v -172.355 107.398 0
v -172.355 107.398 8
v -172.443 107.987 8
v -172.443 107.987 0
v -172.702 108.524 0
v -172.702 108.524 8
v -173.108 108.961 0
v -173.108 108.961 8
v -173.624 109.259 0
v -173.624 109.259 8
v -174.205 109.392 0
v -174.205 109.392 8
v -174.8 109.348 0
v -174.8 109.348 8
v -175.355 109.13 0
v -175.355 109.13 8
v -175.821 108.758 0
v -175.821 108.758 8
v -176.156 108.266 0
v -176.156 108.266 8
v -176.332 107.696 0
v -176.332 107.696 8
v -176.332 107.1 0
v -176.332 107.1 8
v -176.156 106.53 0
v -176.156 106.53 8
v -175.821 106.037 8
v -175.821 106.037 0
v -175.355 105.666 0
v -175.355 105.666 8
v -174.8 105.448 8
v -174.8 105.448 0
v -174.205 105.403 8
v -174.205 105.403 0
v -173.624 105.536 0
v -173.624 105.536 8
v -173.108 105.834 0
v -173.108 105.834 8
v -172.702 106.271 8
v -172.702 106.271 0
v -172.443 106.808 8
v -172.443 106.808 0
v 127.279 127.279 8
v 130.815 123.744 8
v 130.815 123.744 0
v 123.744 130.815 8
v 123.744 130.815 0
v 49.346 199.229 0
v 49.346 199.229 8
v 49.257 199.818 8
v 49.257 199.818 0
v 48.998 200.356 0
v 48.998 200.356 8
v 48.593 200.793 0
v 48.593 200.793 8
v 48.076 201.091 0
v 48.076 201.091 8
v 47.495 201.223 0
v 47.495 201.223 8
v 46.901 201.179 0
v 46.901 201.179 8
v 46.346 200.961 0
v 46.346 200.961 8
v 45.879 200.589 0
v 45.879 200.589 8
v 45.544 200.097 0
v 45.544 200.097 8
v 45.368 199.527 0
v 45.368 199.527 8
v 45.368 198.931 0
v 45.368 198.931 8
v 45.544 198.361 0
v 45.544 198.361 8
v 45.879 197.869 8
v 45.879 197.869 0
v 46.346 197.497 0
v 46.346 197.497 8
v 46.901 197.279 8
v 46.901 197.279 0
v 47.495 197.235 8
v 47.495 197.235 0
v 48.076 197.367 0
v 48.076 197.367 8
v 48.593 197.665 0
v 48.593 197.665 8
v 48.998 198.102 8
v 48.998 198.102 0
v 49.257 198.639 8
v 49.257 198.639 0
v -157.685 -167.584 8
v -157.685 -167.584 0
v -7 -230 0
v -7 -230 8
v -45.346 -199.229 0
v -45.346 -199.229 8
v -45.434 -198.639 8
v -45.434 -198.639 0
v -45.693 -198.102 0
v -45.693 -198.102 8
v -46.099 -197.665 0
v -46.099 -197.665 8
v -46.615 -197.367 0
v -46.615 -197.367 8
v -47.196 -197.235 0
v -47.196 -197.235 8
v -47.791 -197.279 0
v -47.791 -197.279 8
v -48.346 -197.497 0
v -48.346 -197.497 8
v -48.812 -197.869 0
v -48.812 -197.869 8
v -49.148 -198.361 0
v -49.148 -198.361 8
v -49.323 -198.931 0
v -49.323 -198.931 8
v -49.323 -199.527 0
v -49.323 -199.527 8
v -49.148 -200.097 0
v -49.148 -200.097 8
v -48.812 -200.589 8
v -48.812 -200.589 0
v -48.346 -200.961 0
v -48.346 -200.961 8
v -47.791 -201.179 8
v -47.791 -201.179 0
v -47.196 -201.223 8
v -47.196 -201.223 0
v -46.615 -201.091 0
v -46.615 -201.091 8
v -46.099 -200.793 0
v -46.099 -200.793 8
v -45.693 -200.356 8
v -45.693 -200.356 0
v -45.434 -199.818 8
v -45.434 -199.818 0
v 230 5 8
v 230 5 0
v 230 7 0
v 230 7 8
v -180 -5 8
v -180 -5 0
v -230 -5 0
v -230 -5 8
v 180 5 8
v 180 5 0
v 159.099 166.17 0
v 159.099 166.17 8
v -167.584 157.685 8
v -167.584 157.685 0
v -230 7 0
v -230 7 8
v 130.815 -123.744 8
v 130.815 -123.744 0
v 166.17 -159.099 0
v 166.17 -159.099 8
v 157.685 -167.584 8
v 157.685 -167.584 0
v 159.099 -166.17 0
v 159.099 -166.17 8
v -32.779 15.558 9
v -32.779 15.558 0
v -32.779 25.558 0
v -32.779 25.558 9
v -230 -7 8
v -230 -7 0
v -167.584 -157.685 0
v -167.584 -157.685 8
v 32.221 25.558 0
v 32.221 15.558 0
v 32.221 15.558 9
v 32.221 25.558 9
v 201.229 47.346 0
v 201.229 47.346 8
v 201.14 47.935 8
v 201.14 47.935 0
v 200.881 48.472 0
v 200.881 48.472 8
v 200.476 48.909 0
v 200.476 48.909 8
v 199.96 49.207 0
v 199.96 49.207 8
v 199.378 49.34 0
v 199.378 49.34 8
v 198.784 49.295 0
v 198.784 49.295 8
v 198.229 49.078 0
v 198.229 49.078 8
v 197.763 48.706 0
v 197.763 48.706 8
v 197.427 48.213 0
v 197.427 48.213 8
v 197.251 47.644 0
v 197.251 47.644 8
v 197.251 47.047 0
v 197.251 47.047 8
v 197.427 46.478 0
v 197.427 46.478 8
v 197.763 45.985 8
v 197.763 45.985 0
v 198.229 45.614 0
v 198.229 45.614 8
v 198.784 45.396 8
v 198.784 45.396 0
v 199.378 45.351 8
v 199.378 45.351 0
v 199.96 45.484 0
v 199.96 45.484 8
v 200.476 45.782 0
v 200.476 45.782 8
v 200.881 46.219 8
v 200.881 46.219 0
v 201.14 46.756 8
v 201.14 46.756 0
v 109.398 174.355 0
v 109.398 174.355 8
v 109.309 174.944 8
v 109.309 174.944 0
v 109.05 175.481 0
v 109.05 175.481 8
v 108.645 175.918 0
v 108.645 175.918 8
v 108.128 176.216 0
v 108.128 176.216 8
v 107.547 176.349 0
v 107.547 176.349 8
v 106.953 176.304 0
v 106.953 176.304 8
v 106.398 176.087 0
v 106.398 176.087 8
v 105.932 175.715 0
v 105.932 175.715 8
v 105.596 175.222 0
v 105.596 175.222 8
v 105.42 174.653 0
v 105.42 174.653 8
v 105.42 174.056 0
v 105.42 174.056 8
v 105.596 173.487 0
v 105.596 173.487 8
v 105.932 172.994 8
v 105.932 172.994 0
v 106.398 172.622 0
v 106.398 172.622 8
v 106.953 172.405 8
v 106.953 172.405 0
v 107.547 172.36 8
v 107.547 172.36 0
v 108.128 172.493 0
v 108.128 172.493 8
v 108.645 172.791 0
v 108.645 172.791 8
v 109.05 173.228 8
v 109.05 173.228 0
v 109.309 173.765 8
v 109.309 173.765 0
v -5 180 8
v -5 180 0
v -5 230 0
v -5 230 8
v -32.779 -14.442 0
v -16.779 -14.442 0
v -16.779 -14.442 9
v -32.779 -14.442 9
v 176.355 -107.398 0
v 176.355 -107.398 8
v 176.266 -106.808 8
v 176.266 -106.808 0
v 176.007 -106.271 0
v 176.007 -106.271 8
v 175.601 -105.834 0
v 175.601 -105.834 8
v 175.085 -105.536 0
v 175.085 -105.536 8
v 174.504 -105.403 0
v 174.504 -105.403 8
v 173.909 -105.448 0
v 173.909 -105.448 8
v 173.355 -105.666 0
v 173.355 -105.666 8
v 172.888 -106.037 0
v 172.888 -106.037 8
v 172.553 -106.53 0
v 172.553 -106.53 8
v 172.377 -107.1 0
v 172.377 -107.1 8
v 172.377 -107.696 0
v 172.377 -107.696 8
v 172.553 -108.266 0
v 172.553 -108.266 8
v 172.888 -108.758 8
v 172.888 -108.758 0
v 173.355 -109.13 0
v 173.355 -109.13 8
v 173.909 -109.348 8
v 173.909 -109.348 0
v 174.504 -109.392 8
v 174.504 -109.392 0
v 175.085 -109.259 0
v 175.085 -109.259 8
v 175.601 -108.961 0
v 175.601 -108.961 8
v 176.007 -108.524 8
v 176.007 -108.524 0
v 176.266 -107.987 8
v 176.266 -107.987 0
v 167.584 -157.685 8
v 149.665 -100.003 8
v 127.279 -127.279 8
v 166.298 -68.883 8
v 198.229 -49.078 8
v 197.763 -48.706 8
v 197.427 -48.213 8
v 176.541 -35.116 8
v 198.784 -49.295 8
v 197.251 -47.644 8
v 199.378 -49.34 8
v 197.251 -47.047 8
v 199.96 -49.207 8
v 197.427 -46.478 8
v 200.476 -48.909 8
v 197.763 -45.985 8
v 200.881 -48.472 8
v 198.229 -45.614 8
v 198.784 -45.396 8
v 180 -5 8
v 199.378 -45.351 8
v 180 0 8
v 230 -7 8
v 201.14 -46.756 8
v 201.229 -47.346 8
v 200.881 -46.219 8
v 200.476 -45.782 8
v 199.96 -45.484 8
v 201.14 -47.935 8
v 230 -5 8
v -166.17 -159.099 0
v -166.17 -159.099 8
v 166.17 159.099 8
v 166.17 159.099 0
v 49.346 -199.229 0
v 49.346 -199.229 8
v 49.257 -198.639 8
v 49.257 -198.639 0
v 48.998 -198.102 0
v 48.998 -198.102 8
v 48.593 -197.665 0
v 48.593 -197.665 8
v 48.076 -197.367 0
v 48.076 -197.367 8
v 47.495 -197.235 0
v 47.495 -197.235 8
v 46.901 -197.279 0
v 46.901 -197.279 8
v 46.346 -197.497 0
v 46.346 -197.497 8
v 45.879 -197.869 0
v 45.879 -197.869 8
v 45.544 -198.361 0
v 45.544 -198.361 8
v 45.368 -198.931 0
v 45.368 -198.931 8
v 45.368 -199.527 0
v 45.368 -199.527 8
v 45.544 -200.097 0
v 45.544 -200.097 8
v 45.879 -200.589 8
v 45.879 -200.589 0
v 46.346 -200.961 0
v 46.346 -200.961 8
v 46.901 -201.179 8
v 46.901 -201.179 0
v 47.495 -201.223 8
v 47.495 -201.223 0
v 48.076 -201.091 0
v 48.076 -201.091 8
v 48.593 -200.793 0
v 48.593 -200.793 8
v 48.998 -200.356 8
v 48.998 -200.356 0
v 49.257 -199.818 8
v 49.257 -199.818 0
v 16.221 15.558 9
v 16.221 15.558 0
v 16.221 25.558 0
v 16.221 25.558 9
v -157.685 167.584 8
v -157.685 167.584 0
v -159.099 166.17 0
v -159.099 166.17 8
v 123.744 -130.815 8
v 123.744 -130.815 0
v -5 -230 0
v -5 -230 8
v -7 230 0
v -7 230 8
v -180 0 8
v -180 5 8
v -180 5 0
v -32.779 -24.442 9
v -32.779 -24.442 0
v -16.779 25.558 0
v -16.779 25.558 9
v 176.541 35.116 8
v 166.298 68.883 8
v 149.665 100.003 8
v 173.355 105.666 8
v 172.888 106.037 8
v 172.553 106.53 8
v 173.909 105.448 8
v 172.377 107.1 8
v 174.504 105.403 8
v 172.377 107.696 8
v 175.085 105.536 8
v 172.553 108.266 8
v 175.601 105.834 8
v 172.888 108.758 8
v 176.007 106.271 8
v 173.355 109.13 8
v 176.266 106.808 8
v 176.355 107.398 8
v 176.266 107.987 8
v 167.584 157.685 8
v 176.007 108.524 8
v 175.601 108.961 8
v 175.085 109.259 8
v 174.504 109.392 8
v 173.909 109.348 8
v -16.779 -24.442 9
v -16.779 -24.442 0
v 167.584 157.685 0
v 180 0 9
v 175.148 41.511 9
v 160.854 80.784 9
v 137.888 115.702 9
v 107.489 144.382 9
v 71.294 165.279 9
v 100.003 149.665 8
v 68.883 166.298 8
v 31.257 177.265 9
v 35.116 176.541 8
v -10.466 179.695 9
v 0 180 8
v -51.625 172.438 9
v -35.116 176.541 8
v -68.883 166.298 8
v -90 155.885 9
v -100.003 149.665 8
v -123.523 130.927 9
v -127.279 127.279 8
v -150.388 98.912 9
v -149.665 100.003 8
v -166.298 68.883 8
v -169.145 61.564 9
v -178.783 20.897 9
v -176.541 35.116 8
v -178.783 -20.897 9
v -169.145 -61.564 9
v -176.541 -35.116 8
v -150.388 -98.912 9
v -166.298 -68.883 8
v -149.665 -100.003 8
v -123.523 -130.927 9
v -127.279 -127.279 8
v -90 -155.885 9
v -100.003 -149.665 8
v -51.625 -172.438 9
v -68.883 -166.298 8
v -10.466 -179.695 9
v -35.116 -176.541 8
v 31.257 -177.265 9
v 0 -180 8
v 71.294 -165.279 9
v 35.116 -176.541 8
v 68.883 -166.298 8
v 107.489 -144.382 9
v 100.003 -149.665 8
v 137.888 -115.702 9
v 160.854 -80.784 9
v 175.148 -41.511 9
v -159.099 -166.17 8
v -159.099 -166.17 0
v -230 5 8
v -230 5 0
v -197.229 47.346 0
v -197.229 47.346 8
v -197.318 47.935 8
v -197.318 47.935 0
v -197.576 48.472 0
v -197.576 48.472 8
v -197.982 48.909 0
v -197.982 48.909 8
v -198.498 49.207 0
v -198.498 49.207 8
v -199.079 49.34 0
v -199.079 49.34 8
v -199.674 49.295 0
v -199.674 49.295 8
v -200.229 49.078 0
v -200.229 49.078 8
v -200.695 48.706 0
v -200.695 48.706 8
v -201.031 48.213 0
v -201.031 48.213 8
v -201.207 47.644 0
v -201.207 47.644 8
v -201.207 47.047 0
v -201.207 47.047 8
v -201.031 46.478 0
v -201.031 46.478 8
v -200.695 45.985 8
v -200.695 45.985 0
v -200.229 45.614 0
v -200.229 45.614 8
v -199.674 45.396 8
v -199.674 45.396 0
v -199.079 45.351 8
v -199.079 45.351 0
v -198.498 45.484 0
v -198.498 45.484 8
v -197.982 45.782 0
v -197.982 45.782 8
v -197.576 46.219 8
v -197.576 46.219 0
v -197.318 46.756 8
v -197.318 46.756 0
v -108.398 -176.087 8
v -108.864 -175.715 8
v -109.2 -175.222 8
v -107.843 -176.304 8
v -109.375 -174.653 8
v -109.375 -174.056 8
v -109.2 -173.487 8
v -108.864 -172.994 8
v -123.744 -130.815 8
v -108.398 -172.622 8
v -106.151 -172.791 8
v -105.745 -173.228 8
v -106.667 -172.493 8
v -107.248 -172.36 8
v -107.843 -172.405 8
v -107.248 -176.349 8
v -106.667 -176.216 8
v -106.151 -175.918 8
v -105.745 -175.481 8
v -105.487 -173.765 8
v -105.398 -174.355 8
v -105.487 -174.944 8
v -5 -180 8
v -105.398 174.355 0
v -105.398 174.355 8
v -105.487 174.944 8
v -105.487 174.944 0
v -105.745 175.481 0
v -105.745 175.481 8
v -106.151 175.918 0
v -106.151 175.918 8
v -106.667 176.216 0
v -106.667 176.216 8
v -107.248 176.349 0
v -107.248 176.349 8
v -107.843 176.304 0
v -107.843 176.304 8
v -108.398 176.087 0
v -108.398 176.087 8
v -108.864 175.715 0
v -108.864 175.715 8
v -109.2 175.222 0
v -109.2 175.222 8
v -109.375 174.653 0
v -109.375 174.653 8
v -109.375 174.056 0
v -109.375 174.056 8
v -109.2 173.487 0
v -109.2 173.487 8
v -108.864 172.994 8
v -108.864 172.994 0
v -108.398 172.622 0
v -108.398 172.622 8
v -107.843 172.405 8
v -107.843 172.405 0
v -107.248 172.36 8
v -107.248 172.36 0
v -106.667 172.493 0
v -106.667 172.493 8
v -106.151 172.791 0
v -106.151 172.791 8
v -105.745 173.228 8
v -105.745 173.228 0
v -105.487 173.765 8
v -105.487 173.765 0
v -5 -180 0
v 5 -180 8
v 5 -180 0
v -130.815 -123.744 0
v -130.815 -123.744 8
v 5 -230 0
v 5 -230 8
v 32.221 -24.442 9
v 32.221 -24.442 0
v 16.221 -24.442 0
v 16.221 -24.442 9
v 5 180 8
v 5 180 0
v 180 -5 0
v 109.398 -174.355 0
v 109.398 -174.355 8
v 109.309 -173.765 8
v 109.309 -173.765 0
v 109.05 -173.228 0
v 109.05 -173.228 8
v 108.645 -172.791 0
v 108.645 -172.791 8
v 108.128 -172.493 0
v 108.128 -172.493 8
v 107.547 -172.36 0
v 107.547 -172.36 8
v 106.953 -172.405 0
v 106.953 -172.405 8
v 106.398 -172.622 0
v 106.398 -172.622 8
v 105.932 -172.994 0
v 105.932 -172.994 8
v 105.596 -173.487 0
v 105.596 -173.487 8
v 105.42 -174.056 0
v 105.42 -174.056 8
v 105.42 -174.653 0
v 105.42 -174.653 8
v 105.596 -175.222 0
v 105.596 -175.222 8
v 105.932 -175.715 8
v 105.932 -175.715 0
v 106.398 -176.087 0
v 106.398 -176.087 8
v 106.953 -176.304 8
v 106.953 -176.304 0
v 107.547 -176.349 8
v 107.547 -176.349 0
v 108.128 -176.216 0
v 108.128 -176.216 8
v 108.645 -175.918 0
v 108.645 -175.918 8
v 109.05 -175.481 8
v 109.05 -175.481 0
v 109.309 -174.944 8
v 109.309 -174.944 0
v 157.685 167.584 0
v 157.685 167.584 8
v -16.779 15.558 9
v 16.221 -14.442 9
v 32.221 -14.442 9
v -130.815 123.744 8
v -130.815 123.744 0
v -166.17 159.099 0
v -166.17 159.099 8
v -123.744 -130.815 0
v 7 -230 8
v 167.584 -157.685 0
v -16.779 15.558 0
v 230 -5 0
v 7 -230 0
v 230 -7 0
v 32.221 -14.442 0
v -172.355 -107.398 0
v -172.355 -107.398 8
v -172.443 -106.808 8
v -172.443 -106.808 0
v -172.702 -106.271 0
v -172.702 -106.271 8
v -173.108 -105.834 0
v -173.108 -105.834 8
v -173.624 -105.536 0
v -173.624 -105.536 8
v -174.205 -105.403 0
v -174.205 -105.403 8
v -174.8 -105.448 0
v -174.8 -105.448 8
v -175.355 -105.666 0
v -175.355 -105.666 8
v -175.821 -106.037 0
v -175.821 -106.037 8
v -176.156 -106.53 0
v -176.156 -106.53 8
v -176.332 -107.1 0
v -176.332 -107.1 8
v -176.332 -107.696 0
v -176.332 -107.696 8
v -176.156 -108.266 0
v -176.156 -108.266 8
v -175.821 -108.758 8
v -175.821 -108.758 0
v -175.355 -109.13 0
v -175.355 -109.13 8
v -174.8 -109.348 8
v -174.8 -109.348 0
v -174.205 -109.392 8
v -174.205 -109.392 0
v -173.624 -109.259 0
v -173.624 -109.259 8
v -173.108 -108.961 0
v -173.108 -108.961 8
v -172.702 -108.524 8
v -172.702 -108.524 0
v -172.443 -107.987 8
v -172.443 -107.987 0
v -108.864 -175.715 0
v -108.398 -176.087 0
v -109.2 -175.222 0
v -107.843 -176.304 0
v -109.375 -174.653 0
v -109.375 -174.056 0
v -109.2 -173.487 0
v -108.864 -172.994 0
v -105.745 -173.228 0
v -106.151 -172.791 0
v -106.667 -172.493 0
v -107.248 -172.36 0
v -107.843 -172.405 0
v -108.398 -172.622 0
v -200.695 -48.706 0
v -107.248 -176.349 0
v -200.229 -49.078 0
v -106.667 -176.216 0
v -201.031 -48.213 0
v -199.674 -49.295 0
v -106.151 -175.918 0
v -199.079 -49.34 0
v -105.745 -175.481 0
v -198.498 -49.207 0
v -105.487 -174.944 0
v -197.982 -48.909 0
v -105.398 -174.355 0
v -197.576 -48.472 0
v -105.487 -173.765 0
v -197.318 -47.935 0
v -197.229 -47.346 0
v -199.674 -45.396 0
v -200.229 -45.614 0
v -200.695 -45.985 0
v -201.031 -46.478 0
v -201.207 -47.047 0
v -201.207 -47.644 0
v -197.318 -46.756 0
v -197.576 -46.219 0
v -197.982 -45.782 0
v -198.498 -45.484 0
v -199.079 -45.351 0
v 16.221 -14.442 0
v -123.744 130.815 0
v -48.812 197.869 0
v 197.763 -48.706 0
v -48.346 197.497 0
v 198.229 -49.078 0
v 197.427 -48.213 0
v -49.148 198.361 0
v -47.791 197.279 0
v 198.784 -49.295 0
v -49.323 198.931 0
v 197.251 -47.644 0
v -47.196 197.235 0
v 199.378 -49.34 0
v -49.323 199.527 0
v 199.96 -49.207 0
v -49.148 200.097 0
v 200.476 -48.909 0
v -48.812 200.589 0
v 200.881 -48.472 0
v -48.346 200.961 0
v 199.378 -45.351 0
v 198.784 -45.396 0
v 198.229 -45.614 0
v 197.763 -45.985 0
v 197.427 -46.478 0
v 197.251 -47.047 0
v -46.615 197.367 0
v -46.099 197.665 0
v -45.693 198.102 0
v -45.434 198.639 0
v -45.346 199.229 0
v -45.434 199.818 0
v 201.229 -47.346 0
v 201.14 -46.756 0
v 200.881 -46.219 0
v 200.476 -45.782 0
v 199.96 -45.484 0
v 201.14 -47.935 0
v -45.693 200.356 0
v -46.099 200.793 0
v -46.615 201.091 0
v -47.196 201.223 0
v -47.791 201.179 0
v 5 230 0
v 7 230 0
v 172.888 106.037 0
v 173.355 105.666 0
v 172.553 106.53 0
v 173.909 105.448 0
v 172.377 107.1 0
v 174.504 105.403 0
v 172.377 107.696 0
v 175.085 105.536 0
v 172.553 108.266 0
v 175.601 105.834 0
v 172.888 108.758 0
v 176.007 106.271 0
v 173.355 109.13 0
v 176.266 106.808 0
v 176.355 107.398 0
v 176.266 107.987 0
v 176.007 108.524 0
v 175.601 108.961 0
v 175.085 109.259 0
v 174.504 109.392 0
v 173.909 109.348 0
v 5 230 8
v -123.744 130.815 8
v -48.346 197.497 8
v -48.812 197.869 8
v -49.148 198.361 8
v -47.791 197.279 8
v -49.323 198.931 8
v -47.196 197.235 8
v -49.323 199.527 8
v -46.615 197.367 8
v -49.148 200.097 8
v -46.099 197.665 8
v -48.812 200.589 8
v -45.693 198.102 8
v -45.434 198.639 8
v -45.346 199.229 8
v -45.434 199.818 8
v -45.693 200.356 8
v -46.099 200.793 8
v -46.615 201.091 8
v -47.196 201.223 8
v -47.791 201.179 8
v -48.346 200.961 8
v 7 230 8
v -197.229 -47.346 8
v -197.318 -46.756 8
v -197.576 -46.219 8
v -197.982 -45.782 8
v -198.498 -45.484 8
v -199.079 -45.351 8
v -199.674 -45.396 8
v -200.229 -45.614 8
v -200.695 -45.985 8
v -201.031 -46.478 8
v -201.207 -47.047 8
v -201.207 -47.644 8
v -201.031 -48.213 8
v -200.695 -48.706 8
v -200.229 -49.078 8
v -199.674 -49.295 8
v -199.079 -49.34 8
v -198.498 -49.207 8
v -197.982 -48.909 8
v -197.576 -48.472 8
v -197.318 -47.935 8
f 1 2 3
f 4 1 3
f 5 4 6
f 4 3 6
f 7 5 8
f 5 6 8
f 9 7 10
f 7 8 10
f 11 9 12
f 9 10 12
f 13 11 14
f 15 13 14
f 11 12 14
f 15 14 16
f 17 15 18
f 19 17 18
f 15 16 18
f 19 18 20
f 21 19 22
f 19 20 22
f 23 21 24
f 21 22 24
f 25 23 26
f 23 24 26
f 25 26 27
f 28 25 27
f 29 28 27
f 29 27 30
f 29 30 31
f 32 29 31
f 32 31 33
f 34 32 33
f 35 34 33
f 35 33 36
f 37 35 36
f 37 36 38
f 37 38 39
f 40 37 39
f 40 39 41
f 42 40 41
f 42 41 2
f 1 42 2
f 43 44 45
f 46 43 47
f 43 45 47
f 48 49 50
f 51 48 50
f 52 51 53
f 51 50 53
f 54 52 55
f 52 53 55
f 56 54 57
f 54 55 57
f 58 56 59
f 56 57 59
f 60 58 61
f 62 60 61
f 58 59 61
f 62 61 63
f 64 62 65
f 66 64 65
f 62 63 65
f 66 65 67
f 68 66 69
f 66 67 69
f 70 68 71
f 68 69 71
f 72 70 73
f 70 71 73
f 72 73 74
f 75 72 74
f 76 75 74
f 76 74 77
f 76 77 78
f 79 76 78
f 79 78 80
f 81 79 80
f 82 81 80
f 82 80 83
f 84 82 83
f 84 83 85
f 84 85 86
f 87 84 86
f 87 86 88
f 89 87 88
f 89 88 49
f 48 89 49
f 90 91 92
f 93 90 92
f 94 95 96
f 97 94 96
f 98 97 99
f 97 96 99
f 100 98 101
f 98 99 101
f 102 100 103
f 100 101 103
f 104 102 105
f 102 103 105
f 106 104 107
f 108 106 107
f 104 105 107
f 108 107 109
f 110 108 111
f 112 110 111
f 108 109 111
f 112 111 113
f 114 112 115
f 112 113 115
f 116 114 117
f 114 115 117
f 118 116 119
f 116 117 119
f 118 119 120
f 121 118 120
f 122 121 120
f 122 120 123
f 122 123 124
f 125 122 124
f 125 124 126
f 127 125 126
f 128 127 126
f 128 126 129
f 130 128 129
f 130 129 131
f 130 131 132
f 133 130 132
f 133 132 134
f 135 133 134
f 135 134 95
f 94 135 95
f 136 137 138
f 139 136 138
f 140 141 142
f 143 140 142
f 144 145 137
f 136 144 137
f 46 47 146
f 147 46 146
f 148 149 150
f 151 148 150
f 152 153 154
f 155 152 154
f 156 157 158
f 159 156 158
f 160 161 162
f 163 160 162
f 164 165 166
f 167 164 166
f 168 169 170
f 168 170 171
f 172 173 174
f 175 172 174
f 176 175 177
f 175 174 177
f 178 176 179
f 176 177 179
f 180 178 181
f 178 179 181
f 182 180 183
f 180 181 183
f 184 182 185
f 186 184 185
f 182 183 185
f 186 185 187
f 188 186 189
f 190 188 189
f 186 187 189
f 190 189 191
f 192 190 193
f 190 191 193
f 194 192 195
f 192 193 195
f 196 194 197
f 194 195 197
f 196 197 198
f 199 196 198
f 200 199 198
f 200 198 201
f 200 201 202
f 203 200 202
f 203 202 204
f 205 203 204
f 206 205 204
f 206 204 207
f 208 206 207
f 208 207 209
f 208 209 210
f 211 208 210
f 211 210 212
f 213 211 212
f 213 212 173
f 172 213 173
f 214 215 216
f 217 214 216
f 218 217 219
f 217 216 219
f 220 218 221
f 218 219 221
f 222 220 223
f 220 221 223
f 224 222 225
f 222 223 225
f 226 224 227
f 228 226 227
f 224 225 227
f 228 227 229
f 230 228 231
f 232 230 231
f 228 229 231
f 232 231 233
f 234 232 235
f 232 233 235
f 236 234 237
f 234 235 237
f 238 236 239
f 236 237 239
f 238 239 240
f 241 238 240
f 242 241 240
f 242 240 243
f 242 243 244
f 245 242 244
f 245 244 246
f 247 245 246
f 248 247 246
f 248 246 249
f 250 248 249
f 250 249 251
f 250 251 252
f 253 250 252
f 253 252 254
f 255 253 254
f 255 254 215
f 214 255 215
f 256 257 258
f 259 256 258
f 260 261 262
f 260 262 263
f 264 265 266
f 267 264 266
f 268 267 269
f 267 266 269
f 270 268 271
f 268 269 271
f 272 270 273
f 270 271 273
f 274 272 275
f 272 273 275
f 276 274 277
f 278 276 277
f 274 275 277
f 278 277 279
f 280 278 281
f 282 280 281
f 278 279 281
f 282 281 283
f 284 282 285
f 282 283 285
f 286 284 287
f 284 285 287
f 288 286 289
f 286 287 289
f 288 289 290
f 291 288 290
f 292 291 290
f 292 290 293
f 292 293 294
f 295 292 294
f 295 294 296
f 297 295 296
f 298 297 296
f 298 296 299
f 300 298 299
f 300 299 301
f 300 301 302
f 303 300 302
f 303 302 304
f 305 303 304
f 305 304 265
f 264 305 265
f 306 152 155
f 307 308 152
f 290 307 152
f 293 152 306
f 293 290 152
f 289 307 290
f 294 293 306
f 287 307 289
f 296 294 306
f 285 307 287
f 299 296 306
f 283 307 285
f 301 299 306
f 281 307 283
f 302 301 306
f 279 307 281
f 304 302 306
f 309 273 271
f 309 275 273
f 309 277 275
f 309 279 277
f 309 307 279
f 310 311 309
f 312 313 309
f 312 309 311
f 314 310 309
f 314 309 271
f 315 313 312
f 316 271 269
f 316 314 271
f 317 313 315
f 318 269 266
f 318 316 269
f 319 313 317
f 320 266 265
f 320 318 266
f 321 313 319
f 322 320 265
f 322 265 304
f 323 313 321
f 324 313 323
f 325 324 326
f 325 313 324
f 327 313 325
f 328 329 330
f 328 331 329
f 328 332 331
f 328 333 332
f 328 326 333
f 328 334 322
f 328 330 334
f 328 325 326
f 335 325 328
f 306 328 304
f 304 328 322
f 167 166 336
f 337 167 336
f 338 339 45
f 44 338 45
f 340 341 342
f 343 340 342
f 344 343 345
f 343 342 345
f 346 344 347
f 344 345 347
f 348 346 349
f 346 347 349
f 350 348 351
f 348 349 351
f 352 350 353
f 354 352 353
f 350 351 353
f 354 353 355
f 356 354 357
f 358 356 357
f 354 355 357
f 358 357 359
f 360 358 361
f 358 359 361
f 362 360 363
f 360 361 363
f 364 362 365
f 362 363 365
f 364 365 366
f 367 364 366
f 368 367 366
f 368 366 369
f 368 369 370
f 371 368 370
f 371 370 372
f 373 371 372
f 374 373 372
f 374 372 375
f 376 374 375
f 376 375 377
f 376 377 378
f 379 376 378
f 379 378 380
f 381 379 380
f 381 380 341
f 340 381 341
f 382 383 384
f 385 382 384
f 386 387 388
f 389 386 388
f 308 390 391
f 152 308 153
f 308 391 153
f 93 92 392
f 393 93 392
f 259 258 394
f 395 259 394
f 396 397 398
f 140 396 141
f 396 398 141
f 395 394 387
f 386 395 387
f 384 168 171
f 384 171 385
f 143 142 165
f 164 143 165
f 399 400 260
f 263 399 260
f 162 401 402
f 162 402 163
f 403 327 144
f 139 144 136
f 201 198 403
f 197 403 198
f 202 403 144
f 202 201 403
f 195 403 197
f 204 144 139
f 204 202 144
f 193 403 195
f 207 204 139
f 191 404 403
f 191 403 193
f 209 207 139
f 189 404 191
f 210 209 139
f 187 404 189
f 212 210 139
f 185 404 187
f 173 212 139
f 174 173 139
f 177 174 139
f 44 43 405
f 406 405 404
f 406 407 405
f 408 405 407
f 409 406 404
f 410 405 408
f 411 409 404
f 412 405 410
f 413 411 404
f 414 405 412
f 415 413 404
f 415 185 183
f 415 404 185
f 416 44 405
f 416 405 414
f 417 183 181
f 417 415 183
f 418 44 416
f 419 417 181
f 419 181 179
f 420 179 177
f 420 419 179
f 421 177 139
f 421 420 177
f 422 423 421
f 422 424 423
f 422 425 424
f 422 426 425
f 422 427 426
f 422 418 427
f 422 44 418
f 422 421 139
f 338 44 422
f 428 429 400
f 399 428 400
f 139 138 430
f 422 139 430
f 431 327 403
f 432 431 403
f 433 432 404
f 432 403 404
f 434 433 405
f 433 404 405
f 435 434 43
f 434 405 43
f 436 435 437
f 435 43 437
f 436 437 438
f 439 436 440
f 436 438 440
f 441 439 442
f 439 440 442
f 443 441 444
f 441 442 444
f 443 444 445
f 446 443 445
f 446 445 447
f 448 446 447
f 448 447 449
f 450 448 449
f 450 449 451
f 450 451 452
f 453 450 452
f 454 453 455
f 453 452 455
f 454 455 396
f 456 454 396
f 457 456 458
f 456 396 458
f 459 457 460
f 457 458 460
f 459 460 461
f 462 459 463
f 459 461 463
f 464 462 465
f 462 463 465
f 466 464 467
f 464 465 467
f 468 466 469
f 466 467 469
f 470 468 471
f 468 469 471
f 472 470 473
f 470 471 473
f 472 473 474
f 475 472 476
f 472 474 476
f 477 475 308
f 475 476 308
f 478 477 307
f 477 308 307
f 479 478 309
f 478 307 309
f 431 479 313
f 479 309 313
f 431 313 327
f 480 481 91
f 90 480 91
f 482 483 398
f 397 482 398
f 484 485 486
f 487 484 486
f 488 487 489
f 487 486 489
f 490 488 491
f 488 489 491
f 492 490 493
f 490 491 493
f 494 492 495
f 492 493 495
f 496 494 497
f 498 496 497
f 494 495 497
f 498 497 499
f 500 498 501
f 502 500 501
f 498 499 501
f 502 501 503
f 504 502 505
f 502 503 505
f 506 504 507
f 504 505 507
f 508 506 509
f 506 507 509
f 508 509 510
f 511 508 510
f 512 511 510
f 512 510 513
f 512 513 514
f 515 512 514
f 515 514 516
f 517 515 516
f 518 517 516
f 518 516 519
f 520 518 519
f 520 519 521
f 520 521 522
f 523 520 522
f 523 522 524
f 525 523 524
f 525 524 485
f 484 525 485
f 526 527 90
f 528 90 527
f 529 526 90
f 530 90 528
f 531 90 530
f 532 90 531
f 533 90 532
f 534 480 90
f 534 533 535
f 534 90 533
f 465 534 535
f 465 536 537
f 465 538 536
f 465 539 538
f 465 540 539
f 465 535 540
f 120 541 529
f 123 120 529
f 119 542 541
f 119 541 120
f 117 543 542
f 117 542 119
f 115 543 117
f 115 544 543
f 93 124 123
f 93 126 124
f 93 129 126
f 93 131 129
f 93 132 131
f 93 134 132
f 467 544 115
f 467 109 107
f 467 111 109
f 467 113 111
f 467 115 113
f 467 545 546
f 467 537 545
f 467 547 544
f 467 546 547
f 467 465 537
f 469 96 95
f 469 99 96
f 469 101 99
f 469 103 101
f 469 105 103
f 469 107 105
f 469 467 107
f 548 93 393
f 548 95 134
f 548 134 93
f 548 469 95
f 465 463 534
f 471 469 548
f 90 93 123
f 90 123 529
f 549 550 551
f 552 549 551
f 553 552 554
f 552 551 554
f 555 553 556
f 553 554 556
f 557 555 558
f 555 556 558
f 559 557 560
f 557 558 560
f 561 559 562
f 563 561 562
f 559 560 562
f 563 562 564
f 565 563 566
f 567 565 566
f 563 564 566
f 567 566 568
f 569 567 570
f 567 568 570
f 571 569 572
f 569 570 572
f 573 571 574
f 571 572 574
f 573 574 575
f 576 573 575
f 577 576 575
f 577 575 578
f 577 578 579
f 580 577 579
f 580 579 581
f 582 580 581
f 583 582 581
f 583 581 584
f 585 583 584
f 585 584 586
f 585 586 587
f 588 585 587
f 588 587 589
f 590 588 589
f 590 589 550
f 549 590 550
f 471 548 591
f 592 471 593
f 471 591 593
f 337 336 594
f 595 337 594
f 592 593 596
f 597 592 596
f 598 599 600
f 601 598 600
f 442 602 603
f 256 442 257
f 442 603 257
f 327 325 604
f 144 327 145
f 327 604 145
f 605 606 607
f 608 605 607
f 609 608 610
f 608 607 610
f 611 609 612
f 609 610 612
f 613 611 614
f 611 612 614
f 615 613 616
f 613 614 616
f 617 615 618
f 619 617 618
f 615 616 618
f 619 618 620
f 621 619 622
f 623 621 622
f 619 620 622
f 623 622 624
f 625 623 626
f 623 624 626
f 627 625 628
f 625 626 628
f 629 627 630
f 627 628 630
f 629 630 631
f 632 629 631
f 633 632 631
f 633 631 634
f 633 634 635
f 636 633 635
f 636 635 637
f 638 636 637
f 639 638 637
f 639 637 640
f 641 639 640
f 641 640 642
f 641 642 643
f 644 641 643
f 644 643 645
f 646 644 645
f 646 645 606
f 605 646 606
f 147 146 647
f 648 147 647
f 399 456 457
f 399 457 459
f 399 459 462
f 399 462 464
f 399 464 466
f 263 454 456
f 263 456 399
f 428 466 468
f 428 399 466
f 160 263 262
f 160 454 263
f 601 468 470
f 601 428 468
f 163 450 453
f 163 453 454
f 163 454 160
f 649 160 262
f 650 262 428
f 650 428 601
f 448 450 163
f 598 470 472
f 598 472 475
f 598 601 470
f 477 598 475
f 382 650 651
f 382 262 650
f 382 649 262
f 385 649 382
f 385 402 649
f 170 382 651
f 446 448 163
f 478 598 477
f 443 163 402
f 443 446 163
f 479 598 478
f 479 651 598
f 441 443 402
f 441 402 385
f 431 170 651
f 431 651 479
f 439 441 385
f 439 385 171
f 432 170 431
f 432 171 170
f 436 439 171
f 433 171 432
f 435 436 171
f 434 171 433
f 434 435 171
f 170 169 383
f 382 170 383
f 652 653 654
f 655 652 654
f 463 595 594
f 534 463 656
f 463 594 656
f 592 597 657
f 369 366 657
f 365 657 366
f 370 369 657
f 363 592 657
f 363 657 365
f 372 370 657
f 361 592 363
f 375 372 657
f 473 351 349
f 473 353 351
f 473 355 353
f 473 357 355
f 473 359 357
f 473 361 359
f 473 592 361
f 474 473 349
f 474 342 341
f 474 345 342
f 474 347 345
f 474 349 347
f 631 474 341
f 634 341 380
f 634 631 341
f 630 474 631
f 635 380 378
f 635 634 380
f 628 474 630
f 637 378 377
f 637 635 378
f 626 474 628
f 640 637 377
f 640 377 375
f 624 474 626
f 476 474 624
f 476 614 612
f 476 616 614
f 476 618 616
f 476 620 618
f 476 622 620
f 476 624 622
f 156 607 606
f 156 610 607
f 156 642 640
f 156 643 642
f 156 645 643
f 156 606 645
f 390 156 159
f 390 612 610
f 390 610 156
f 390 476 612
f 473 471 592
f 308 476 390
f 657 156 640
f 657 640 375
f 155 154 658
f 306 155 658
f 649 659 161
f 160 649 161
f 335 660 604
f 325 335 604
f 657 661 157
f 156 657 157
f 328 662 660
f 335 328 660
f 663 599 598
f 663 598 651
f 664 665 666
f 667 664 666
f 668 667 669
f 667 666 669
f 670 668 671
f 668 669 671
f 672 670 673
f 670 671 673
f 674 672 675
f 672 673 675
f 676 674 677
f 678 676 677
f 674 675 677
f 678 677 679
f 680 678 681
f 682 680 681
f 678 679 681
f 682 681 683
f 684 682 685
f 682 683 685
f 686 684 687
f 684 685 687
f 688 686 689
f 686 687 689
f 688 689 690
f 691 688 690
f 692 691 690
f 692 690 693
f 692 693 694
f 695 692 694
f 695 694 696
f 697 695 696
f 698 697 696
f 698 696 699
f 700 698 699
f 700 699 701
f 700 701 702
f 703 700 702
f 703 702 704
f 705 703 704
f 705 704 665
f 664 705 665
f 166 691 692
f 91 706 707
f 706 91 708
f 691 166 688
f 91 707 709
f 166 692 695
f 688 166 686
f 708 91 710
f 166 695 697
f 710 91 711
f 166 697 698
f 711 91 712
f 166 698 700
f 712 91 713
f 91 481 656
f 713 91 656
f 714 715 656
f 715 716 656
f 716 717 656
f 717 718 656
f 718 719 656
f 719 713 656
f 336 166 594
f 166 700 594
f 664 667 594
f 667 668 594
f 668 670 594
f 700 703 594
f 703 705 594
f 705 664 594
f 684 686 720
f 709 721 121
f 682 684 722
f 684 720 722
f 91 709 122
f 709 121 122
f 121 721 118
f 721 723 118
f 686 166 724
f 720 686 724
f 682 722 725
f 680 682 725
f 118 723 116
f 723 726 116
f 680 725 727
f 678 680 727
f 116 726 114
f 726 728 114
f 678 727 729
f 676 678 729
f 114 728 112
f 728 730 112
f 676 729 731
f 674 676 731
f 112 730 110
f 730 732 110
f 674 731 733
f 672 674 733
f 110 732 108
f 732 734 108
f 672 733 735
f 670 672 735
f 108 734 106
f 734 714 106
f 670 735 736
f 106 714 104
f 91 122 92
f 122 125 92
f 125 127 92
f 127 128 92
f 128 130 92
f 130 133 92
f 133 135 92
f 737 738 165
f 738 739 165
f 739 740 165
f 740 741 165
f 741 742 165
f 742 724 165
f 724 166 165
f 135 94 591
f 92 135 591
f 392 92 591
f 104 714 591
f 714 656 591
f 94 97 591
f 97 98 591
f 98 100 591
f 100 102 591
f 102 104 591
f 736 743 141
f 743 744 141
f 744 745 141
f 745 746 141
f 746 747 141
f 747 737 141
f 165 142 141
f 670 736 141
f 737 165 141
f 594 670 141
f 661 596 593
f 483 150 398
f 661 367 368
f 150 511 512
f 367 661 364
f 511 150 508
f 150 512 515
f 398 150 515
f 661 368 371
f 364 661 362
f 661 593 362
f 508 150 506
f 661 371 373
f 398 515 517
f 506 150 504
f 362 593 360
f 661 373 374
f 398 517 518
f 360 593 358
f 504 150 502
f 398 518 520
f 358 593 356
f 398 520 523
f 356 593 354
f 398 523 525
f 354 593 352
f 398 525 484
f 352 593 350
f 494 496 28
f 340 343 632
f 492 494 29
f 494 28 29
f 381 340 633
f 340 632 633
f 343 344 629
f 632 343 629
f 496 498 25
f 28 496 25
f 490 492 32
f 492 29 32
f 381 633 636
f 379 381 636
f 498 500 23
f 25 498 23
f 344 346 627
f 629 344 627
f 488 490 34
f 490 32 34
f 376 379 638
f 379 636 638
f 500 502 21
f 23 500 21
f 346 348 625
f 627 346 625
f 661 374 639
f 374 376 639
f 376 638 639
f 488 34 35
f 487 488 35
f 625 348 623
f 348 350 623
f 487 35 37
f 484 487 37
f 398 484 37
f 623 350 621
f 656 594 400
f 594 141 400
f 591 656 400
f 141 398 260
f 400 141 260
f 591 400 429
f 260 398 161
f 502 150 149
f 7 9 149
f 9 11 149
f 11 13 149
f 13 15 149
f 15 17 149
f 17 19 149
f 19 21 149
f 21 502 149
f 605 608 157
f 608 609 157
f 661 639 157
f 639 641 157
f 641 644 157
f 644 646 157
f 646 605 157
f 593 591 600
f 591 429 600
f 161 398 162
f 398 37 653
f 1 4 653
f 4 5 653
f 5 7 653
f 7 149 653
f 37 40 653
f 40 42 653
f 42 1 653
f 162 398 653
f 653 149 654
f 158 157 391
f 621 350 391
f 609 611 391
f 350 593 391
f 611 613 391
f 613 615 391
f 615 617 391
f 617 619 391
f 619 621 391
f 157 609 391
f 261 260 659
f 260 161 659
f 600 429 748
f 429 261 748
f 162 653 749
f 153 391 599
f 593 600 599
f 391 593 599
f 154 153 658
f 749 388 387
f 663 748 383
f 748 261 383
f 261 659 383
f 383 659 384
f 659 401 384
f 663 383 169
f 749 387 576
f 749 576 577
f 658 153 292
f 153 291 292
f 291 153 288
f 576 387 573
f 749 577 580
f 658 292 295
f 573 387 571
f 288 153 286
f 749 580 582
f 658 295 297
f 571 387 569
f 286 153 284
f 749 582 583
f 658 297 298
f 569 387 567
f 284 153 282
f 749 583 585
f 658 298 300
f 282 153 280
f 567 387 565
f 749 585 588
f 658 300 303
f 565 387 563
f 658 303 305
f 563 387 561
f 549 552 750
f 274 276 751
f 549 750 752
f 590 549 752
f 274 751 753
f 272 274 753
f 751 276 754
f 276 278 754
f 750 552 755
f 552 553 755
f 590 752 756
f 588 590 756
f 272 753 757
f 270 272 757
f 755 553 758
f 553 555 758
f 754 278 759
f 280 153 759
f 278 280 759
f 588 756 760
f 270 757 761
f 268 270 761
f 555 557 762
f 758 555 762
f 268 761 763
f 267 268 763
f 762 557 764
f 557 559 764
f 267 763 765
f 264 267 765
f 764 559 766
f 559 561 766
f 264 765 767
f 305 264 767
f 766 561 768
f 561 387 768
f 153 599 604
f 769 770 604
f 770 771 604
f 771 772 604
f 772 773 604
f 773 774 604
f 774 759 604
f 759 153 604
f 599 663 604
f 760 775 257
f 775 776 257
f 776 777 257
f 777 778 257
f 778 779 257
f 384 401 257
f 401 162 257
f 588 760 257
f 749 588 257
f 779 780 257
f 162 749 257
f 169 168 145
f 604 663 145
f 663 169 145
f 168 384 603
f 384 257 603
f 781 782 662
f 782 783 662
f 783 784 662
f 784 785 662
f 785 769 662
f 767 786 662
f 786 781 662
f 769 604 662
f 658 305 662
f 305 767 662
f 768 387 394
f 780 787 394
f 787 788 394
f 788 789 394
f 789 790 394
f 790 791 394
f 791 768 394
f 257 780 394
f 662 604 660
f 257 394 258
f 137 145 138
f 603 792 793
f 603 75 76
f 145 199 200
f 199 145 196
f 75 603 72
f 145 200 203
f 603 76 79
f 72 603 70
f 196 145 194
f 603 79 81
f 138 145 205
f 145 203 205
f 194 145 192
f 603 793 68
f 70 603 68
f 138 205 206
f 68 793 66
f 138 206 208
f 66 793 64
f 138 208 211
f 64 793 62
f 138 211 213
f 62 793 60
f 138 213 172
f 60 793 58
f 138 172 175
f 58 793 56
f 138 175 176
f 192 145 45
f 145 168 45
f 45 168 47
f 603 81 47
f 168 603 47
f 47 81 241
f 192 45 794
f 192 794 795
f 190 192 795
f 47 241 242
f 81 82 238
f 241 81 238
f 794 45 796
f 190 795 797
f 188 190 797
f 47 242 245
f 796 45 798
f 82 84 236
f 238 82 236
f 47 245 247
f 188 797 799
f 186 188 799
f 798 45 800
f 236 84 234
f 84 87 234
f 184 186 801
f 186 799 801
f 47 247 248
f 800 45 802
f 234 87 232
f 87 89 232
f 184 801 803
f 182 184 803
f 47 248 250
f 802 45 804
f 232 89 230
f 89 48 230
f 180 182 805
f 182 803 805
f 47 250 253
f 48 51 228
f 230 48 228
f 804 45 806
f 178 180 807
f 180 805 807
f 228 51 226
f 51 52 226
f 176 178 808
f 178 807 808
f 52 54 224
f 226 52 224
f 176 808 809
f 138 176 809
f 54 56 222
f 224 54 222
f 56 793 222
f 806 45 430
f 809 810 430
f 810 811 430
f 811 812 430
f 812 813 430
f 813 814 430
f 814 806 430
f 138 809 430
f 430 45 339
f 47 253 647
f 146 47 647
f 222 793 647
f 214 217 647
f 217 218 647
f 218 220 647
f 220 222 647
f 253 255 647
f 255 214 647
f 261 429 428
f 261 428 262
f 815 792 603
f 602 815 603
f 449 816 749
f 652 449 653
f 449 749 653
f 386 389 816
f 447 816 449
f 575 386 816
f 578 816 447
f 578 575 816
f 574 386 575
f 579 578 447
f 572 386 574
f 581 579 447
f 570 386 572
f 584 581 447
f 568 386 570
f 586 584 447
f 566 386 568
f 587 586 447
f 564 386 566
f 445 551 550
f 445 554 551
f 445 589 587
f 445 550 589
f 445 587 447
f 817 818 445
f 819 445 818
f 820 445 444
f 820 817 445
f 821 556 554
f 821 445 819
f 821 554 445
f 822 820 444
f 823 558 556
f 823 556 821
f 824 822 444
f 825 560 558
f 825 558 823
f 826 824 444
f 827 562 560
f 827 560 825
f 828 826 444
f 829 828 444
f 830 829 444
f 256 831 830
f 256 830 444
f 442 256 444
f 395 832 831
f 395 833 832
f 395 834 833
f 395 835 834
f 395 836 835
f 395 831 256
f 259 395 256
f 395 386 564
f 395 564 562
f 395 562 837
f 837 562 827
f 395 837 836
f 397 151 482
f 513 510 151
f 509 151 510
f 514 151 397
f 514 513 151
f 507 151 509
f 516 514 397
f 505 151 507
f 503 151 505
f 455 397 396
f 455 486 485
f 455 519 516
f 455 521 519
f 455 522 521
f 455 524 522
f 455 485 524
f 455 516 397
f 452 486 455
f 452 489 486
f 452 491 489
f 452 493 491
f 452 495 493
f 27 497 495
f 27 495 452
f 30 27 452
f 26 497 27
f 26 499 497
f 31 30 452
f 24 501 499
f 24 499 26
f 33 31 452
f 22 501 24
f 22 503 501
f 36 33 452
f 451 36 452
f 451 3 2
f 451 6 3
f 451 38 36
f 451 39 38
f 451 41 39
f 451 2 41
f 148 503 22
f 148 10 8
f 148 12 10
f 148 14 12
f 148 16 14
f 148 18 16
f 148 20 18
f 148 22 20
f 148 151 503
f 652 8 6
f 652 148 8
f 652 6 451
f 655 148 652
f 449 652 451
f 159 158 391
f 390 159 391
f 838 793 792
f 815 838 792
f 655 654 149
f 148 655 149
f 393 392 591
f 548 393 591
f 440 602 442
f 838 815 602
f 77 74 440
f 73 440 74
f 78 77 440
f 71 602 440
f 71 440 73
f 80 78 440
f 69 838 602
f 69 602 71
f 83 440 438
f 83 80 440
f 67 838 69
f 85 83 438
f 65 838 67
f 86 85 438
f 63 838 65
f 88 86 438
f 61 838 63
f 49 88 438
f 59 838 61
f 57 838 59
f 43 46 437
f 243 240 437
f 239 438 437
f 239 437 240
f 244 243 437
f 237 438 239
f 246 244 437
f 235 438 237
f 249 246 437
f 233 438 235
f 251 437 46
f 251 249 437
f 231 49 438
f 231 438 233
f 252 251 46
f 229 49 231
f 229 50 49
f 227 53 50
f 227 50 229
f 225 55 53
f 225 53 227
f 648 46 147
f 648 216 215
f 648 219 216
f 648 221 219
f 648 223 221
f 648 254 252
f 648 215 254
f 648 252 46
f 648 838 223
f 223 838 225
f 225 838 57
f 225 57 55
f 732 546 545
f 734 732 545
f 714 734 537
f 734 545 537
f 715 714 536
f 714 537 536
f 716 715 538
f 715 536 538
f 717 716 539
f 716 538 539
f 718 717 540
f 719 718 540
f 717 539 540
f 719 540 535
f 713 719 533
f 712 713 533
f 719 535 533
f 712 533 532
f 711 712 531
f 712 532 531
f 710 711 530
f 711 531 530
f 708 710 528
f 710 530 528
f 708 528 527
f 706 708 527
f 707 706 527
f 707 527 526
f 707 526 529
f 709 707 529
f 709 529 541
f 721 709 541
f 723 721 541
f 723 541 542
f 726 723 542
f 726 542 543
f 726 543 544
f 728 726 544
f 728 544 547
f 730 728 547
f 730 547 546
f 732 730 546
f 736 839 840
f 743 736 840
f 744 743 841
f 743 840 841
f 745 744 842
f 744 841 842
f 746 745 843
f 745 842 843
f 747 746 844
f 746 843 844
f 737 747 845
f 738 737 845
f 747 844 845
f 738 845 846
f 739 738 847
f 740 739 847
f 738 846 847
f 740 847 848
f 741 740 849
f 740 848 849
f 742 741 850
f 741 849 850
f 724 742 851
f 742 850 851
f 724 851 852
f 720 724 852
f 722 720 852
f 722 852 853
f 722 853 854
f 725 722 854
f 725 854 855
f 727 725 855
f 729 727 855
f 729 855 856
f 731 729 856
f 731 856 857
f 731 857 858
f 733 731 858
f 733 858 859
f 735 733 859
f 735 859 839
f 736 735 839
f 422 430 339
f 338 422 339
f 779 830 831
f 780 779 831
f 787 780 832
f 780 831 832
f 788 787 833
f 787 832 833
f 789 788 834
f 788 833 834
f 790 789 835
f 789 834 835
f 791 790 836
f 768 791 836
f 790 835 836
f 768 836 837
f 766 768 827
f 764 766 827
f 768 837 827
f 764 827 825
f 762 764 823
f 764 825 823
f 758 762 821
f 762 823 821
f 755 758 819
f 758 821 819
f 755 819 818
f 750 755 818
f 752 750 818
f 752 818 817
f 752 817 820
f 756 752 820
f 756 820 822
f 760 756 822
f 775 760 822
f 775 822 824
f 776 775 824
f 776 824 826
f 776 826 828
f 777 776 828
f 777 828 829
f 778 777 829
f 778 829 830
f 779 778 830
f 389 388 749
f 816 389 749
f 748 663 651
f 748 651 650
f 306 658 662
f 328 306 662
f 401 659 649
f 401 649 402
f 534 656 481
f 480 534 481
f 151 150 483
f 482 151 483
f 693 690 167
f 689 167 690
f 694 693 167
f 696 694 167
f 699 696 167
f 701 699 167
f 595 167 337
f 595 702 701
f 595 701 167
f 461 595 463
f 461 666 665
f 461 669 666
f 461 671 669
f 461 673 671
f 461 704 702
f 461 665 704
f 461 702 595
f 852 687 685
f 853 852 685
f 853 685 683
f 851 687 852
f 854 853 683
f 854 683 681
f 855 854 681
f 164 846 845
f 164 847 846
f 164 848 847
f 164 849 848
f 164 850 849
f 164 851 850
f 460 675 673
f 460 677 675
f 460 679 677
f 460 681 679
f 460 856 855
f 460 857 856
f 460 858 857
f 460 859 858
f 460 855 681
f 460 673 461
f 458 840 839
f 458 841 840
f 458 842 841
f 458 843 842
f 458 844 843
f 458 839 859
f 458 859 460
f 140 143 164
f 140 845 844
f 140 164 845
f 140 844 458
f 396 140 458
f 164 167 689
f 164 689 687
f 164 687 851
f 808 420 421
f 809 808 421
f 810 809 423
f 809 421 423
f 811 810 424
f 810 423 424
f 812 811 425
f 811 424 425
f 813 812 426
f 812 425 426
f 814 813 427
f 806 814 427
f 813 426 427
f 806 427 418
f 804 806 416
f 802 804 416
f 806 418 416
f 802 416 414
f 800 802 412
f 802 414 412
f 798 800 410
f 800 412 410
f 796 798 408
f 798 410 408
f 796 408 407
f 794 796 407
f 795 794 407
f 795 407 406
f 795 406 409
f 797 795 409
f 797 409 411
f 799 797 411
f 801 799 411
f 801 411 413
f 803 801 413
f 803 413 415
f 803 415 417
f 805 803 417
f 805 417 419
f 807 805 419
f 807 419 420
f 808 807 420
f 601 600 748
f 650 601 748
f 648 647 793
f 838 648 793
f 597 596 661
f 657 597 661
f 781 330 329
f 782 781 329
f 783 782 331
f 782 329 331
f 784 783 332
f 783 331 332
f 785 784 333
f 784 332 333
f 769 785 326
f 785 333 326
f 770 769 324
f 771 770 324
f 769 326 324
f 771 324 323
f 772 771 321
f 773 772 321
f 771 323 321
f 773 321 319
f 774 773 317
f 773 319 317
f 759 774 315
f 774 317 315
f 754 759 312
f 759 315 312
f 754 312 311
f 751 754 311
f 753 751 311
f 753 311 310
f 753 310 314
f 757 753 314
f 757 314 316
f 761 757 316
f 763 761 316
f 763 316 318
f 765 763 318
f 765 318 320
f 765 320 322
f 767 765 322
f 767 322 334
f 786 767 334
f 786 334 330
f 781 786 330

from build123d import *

# Parameters (mm, degrees)
BOSS_EXTRUDE1_DEPTH = 8
SKETCH2_R           = 180
BOSS_EXTRUDE2_DEPTH = 1
CUT_EXTRUDE1_REACH  = 10
SKETCH3_R           = 2
CUT_EXTRUDE2_REACH  = 11
SKETCH5_W           = 16
SKETCH5_H           = 10


with BuildPart() as part:
    # Sketch1 → Boss-Extrude1 (new body)
    with BuildSketch(Plane.XY):
        Polygon((5, 230), (5, 180), (-5, 180), (-5, 230), (-7, 230), (-157.684812205, 167.584307141), (-159.099025767, 166.170093579), (-123.743686708, 130.814754519), (-130.81475452, 123.743686708), (-166.170093579, 159.099025767), (-167.584307141, 157.684812205), (-230, 7), (-230, 5), (-180, 5), (-180, -5), (-230, -5), (-230, -7), (-167.584307141, -157.684812205), (-166.170093579, -159.099025767), (-130.81475452, -123.743686708), (-123.743686708, -130.81475452), (-159.099025767, -166.170093579), (-157.684812205, -167.584307141), (-7, -230), (-5, -230), (-5, -180), (5, -180), (5, -230), (7, -230), (157.684812205, -167.584307141), (159.099025767, -166.170093579), (123.743686708, -130.814754519), (130.81475452, -123.743686708), (166.170093579, -159.099025767), (167.584307141, -157.684812205), (230, -7), (230, -5), (180, -5), (180, 5), (230, 5), (230, 7), (167.584307141, 157.684812205), (166.170093579, 159.099025767), (130.81475452, 123.743686708), (123.743686708, 130.81475452), (159.099025767, 166.170093579), (157.684812205, 167.584307141), (7, 230), align=None)
    extrude(amount=BOSS_EXTRUDE1_DEPTH)

    # Sketch2 → Boss-Extrude2 (add)
    with BuildSketch(Plane.XY.offset(8)):
        Circle(SKETCH2_R)
    extrude(amount=BOSS_EXTRUDE2_DEPTH)

    # Sketch3 → Cut-Extrude1 (cut, up to next)
    with BuildSketch(Plane.XY.offset(8), mode=Mode.PRIVATE) as cut_extrude1_sk1:
        with Locations((107.397750993, 174.354514299)):
            Circle(SKETCH3_R)
    cut_extrude1_tool1 = extrude(cut_extrude1_sk1.sketch, amount=-CUT_EXTRUDE1_REACH, mode=Mode.PRIVATE) & part.part
    add(cut_extrude1_tool1.solids().sort_by_distance((107.397751, 174.354514, 8))[0], mode=Mode.SUBTRACT)
    # Sketch3 → Cut-Extrude1 (cut, up to next)
    with BuildSketch(Plane.XY.offset(8), mode=Mode.PRIVATE) as cut_extrude1_sk2:
        with Locations((47.34558138, 199.228937402)):
            Circle(SKETCH3_R)
    cut_extrude1_tool2 = extrude(cut_extrude1_sk2.sketch, amount=-CUT_EXTRUDE1_REACH, mode=Mode.PRIVATE) & part.part
    add(cut_extrude1_tool2.solids().sort_by_distance((47.345581, 199.228937, 8))[0], mode=Mode.SUBTRACT)
    # Sketch3 → Cut-Extrude1 (cut, up to next)
    with BuildSketch(Plane.XY.offset(8), mode=Mode.PRIVATE) as cut_extrude1_sk3:
        with Locations((199.228937402, 47.34558138)):
            Circle(SKETCH3_R)
    cut_extrude1_tool3 = extrude(cut_extrude1_sk3.sketch, amount=-CUT_EXTRUDE1_REACH, mode=Mode.PRIVATE) & part.part
    add(cut_extrude1_tool3.solids().sort_by_distance((199.228937, 47.345581, 8))[0], mode=Mode.SUBTRACT)
    # Sketch3 → Cut-Extrude1 (cut, up to next)
    with BuildSketch(Plane.XY.offset(8), mode=Mode.PRIVATE) as cut_extrude1_sk4:
        with Locations((174.354514299, 107.397750993)):
            Circle(SKETCH3_R)
    cut_extrude1_tool4 = extrude(cut_extrude1_sk4.sketch, amount=-CUT_EXTRUDE1_REACH, mode=Mode.PRIVATE) & part.part
    add(cut_extrude1_tool4.solids().sort_by_distance((174.354514, 107.397751, 8))[0], mode=Mode.SUBTRACT)
    # Sketch3 → Cut-Extrude1 (cut, up to next)
    with BuildSketch(Plane.XY.offset(8), mode=Mode.PRIVATE) as cut_extrude1_sk5:
        with Locations((174.354514299, -107.397750993)):
            Circle(SKETCH3_R)
    cut_extrude1_tool5 = extrude(cut_extrude1_sk5.sketch, amount=-CUT_EXTRUDE1_REACH, mode=Mode.PRIVATE) & part.part
    add(cut_extrude1_tool5.solids().sort_by_distance((174.354514, -107.397751, 8))[0], mode=Mode.SUBTRACT)
    # Sketch3 → Cut-Extrude1 (cut, up to next)
    with BuildSketch(Plane.XY.offset(8), mode=Mode.PRIVATE) as cut_extrude1_sk6:
        with Locations((199.228937402, -47.34558138)):
            Circle(SKETCH3_R)
    cut_extrude1_tool6 = extrude(cut_extrude1_sk6.sketch, amount=-CUT_EXTRUDE1_REACH, mode=Mode.PRIVATE) & part.part
    add(cut_extrude1_tool6.solids().sort_by_distance((199.228937, -47.345581, 8))[0], mode=Mode.SUBTRACT)
    # Sketch3 → Cut-Extrude1 (cut, up to next)
    with BuildSketch(Plane.XY.offset(8), mode=Mode.PRIVATE) as cut_extrude1_sk7:
        with Locations((47.34558138, -199.228937402)):
            Circle(SKETCH3_R)
    cut_extrude1_tool7 = extrude(cut_extrude1_sk7.sketch, amount=-CUT_EXTRUDE1_REACH, mode=Mode.PRIVATE) & part.part
    add(cut_extrude1_tool7.solids().sort_by_distance((47.345581, -199.228937, 8))[0], mode=Mode.SUBTRACT)
    # Sketch3 → Cut-Extrude1 (cut, up to next)
    with BuildSketch(Plane.XY.offset(8), mode=Mode.PRIVATE) as cut_extrude1_sk8:
        with Locations((107.397750993, -174.354514299)):
            Circle(SKETCH3_R)
    cut_extrude1_tool8 = extrude(cut_extrude1_sk8.sketch, amount=-CUT_EXTRUDE1_REACH, mode=Mode.PRIVATE) & part.part
    add(cut_extrude1_tool8.solids().sort_by_distance((107.397751, -174.354514, 8))[0], mode=Mode.SUBTRACT)
    # Sketch3 → Cut-Extrude1 (cut, up to next)
    with BuildSketch(Plane.XY.offset(8), mode=Mode.PRIVATE) as cut_extrude1_sk9:
        with Locations((-107.397750993, -174.354514299)):
            Circle(SKETCH3_R)
    cut_extrude1_tool9 = extrude(cut_extrude1_sk9.sketch, amount=-CUT_EXTRUDE1_REACH, mode=Mode.PRIVATE) & part.part
    add(cut_extrude1_tool9.solids().sort_by_distance((-107.397751, -174.354514, 8))[0], mode=Mode.SUBTRACT)
    # Sketch3 → Cut-Extrude1 (cut, up to next)
    with BuildSketch(Plane.XY.offset(8), mode=Mode.PRIVATE) as cut_extrude1_sk10:
        with Locations((-47.34558138, -199.228937402)):
            Circle(SKETCH3_R)
    cut_extrude1_tool10 = extrude(cut_extrude1_sk10.sketch, amount=-CUT_EXTRUDE1_REACH, mode=Mode.PRIVATE) & part.part
    add(cut_extrude1_tool10.solids().sort_by_distance((-47.345581, -199.228937, 8))[0], mode=Mode.SUBTRACT)
    # Sketch3 → Cut-Extrude1 (cut, up to next)
    with BuildSketch(Plane.XY.offset(8), mode=Mode.PRIVATE) as cut_extrude1_sk11:
        with Locations((-199.228937402, -47.34558138)):
            Circle(SKETCH3_R)
    cut_extrude1_tool11 = extrude(cut_extrude1_sk11.sketch, amount=-CUT_EXTRUDE1_REACH, mode=Mode.PRIVATE) & part.part
    add(cut_extrude1_tool11.solids().sort_by_distance((-199.228937, -47.345581, 8))[0], mode=Mode.SUBTRACT)
    # Sketch3 → Cut-Extrude1 (cut, up to next)
    with BuildSketch(Plane.XY.offset(8), mode=Mode.PRIVATE) as cut_extrude1_sk12:
        with Locations((-174.354514299, -107.397750993)):
            Circle(SKETCH3_R)
    cut_extrude1_tool12 = extrude(cut_extrude1_sk12.sketch, amount=-CUT_EXTRUDE1_REACH, mode=Mode.PRIVATE) & part.part
    add(cut_extrude1_tool12.solids().sort_by_distance((-174.354514, -107.397751, 8))[0], mode=Mode.SUBTRACT)
    # Sketch3 → Cut-Extrude1 (cut, up to next)
    with BuildSketch(Plane.XY.offset(8), mode=Mode.PRIVATE) as cut_extrude1_sk13:
        with Locations((-174.354514299, 107.397750993)):
            Circle(SKETCH3_R)
    cut_extrude1_tool13 = extrude(cut_extrude1_sk13.sketch, amount=-CUT_EXTRUDE1_REACH, mode=Mode.PRIVATE) & part.part
    add(cut_extrude1_tool13.solids().sort_by_distance((-174.354514, 107.397751, 8))[0], mode=Mode.SUBTRACT)
    # Sketch3 → Cut-Extrude1 (cut, up to next)
    with BuildSketch(Plane.XY.offset(8), mode=Mode.PRIVATE) as cut_extrude1_sk14:
        with Locations((-199.228937402, 47.34558138)):
            Circle(SKETCH3_R)
    cut_extrude1_tool14 = extrude(cut_extrude1_sk14.sketch, amount=-CUT_EXTRUDE1_REACH, mode=Mode.PRIVATE) & part.part
    add(cut_extrude1_tool14.solids().sort_by_distance((-199.228937, 47.345581, 8))[0], mode=Mode.SUBTRACT)
    # Sketch3 → Cut-Extrude1 (cut, up to next)
    with BuildSketch(Plane.XY.offset(8), mode=Mode.PRIVATE) as cut_extrude1_sk15:
        with Locations((-47.34558138, 199.228937402)):
            Circle(SKETCH3_R)
    cut_extrude1_tool15 = extrude(cut_extrude1_sk15.sketch, amount=-CUT_EXTRUDE1_REACH, mode=Mode.PRIVATE) & part.part
    add(cut_extrude1_tool15.solids().sort_by_distance((-47.345581, 199.228937, 8))[0], mode=Mode.SUBTRACT)
    # Sketch3 → Cut-Extrude1 (cut, up to next)
    with BuildSketch(Plane.XY.offset(8), mode=Mode.PRIVATE) as cut_extrude1_sk16:
        with Locations((-107.397750993, 174.354514299)):
            Circle(SKETCH3_R)
    cut_extrude1_tool16 = extrude(cut_extrude1_sk16.sketch, amount=-CUT_EXTRUDE1_REACH, mode=Mode.PRIVATE) & part.part
    add(cut_extrude1_tool16.solids().sort_by_distance((-107.397751, 174.354514, 8))[0], mode=Mode.SUBTRACT)

    # Sketch5 → Cut-Extrude2 (cut, up to next)
    with BuildSketch(Plane(origin=(0, 0, 0), x_dir=(-1, 0, 0), z_dir=(0, 0, -1)), mode=Mode.PRIVATE) as cut_extrude2_sk1:
        with Locations((-24.221028692, -19.442057383)):
            Rectangle(SKETCH5_W, SKETCH5_H)
    cut_extrude2_tool1 = extrude(cut_extrude2_sk1.sketch, amount=-CUT_EXTRUDE2_REACH, mode=Mode.PRIVATE) & part.part
    add(cut_extrude2_tool1.solids().sort_by_distance((24.221029, -19.442057, 0))[0], mode=Mode.SUBTRACT)
    # Sketch5 → Cut-Extrude2 (cut, up to next)
    with BuildSketch(Plane(origin=(0, 0, 0), x_dir=(-1, 0, 0), z_dir=(0, 0, -1)), mode=Mode.PRIVATE) as cut_extrude2_sk2:
        with Locations((-24.221028692, 20.557942617)):
            Rectangle(SKETCH5_W, SKETCH5_H)
    cut_extrude2_tool2 = extrude(cut_extrude2_sk2.sketch, amount=-CUT_EXTRUDE2_REACH, mode=Mode.PRIVATE) & part.part
    add(cut_extrude2_tool2.solids().sort_by_distance((24.221029, 20.557943, 0))[0], mode=Mode.SUBTRACT)
    # Sketch5 → Cut-Extrude2 (cut, up to next)
    with BuildSketch(Plane(origin=(0, 0, 0), x_dir=(-1, 0, 0), z_dir=(0, 0, -1)), mode=Mode.PRIVATE) as cut_extrude2_sk3:
        with Locations((24.778971308, 20.557942617)):
            Rectangle(SKETCH5_W, SKETCH5_H)
    cut_extrude2_tool3 = extrude(cut_extrude2_sk3.sketch, amount=-CUT_EXTRUDE2_REACH, mode=Mode.PRIVATE) & part.part
    add(cut_extrude2_tool3.solids().sort_by_distance((-24.778971, 20.557943, 0))[0], mode=Mode.SUBTRACT)
    # Sketch5 → Cut-Extrude2 (cut, up to next)
    with BuildSketch(Plane(origin=(0, 0, 0), x_dir=(-1, 0, 0), z_dir=(0, 0, -1)), mode=Mode.PRIVATE) as cut_extrude2_sk4:
        with Locations((24.778971308, -19.442057383)):
            Rectangle(SKETCH5_W, SKETCH5_H)
    cut_extrude2_tool4 = extrude(cut_extrude2_sk4.sketch, amount=-CUT_EXTRUDE2_REACH, mode=Mode.PRIVATE) & part.part
    add(cut_extrude2_tool4.solids().sort_by_distance((-24.778971, -19.442057, 0))[0], mode=Mode.SUBTRACT)


solid = part.part
